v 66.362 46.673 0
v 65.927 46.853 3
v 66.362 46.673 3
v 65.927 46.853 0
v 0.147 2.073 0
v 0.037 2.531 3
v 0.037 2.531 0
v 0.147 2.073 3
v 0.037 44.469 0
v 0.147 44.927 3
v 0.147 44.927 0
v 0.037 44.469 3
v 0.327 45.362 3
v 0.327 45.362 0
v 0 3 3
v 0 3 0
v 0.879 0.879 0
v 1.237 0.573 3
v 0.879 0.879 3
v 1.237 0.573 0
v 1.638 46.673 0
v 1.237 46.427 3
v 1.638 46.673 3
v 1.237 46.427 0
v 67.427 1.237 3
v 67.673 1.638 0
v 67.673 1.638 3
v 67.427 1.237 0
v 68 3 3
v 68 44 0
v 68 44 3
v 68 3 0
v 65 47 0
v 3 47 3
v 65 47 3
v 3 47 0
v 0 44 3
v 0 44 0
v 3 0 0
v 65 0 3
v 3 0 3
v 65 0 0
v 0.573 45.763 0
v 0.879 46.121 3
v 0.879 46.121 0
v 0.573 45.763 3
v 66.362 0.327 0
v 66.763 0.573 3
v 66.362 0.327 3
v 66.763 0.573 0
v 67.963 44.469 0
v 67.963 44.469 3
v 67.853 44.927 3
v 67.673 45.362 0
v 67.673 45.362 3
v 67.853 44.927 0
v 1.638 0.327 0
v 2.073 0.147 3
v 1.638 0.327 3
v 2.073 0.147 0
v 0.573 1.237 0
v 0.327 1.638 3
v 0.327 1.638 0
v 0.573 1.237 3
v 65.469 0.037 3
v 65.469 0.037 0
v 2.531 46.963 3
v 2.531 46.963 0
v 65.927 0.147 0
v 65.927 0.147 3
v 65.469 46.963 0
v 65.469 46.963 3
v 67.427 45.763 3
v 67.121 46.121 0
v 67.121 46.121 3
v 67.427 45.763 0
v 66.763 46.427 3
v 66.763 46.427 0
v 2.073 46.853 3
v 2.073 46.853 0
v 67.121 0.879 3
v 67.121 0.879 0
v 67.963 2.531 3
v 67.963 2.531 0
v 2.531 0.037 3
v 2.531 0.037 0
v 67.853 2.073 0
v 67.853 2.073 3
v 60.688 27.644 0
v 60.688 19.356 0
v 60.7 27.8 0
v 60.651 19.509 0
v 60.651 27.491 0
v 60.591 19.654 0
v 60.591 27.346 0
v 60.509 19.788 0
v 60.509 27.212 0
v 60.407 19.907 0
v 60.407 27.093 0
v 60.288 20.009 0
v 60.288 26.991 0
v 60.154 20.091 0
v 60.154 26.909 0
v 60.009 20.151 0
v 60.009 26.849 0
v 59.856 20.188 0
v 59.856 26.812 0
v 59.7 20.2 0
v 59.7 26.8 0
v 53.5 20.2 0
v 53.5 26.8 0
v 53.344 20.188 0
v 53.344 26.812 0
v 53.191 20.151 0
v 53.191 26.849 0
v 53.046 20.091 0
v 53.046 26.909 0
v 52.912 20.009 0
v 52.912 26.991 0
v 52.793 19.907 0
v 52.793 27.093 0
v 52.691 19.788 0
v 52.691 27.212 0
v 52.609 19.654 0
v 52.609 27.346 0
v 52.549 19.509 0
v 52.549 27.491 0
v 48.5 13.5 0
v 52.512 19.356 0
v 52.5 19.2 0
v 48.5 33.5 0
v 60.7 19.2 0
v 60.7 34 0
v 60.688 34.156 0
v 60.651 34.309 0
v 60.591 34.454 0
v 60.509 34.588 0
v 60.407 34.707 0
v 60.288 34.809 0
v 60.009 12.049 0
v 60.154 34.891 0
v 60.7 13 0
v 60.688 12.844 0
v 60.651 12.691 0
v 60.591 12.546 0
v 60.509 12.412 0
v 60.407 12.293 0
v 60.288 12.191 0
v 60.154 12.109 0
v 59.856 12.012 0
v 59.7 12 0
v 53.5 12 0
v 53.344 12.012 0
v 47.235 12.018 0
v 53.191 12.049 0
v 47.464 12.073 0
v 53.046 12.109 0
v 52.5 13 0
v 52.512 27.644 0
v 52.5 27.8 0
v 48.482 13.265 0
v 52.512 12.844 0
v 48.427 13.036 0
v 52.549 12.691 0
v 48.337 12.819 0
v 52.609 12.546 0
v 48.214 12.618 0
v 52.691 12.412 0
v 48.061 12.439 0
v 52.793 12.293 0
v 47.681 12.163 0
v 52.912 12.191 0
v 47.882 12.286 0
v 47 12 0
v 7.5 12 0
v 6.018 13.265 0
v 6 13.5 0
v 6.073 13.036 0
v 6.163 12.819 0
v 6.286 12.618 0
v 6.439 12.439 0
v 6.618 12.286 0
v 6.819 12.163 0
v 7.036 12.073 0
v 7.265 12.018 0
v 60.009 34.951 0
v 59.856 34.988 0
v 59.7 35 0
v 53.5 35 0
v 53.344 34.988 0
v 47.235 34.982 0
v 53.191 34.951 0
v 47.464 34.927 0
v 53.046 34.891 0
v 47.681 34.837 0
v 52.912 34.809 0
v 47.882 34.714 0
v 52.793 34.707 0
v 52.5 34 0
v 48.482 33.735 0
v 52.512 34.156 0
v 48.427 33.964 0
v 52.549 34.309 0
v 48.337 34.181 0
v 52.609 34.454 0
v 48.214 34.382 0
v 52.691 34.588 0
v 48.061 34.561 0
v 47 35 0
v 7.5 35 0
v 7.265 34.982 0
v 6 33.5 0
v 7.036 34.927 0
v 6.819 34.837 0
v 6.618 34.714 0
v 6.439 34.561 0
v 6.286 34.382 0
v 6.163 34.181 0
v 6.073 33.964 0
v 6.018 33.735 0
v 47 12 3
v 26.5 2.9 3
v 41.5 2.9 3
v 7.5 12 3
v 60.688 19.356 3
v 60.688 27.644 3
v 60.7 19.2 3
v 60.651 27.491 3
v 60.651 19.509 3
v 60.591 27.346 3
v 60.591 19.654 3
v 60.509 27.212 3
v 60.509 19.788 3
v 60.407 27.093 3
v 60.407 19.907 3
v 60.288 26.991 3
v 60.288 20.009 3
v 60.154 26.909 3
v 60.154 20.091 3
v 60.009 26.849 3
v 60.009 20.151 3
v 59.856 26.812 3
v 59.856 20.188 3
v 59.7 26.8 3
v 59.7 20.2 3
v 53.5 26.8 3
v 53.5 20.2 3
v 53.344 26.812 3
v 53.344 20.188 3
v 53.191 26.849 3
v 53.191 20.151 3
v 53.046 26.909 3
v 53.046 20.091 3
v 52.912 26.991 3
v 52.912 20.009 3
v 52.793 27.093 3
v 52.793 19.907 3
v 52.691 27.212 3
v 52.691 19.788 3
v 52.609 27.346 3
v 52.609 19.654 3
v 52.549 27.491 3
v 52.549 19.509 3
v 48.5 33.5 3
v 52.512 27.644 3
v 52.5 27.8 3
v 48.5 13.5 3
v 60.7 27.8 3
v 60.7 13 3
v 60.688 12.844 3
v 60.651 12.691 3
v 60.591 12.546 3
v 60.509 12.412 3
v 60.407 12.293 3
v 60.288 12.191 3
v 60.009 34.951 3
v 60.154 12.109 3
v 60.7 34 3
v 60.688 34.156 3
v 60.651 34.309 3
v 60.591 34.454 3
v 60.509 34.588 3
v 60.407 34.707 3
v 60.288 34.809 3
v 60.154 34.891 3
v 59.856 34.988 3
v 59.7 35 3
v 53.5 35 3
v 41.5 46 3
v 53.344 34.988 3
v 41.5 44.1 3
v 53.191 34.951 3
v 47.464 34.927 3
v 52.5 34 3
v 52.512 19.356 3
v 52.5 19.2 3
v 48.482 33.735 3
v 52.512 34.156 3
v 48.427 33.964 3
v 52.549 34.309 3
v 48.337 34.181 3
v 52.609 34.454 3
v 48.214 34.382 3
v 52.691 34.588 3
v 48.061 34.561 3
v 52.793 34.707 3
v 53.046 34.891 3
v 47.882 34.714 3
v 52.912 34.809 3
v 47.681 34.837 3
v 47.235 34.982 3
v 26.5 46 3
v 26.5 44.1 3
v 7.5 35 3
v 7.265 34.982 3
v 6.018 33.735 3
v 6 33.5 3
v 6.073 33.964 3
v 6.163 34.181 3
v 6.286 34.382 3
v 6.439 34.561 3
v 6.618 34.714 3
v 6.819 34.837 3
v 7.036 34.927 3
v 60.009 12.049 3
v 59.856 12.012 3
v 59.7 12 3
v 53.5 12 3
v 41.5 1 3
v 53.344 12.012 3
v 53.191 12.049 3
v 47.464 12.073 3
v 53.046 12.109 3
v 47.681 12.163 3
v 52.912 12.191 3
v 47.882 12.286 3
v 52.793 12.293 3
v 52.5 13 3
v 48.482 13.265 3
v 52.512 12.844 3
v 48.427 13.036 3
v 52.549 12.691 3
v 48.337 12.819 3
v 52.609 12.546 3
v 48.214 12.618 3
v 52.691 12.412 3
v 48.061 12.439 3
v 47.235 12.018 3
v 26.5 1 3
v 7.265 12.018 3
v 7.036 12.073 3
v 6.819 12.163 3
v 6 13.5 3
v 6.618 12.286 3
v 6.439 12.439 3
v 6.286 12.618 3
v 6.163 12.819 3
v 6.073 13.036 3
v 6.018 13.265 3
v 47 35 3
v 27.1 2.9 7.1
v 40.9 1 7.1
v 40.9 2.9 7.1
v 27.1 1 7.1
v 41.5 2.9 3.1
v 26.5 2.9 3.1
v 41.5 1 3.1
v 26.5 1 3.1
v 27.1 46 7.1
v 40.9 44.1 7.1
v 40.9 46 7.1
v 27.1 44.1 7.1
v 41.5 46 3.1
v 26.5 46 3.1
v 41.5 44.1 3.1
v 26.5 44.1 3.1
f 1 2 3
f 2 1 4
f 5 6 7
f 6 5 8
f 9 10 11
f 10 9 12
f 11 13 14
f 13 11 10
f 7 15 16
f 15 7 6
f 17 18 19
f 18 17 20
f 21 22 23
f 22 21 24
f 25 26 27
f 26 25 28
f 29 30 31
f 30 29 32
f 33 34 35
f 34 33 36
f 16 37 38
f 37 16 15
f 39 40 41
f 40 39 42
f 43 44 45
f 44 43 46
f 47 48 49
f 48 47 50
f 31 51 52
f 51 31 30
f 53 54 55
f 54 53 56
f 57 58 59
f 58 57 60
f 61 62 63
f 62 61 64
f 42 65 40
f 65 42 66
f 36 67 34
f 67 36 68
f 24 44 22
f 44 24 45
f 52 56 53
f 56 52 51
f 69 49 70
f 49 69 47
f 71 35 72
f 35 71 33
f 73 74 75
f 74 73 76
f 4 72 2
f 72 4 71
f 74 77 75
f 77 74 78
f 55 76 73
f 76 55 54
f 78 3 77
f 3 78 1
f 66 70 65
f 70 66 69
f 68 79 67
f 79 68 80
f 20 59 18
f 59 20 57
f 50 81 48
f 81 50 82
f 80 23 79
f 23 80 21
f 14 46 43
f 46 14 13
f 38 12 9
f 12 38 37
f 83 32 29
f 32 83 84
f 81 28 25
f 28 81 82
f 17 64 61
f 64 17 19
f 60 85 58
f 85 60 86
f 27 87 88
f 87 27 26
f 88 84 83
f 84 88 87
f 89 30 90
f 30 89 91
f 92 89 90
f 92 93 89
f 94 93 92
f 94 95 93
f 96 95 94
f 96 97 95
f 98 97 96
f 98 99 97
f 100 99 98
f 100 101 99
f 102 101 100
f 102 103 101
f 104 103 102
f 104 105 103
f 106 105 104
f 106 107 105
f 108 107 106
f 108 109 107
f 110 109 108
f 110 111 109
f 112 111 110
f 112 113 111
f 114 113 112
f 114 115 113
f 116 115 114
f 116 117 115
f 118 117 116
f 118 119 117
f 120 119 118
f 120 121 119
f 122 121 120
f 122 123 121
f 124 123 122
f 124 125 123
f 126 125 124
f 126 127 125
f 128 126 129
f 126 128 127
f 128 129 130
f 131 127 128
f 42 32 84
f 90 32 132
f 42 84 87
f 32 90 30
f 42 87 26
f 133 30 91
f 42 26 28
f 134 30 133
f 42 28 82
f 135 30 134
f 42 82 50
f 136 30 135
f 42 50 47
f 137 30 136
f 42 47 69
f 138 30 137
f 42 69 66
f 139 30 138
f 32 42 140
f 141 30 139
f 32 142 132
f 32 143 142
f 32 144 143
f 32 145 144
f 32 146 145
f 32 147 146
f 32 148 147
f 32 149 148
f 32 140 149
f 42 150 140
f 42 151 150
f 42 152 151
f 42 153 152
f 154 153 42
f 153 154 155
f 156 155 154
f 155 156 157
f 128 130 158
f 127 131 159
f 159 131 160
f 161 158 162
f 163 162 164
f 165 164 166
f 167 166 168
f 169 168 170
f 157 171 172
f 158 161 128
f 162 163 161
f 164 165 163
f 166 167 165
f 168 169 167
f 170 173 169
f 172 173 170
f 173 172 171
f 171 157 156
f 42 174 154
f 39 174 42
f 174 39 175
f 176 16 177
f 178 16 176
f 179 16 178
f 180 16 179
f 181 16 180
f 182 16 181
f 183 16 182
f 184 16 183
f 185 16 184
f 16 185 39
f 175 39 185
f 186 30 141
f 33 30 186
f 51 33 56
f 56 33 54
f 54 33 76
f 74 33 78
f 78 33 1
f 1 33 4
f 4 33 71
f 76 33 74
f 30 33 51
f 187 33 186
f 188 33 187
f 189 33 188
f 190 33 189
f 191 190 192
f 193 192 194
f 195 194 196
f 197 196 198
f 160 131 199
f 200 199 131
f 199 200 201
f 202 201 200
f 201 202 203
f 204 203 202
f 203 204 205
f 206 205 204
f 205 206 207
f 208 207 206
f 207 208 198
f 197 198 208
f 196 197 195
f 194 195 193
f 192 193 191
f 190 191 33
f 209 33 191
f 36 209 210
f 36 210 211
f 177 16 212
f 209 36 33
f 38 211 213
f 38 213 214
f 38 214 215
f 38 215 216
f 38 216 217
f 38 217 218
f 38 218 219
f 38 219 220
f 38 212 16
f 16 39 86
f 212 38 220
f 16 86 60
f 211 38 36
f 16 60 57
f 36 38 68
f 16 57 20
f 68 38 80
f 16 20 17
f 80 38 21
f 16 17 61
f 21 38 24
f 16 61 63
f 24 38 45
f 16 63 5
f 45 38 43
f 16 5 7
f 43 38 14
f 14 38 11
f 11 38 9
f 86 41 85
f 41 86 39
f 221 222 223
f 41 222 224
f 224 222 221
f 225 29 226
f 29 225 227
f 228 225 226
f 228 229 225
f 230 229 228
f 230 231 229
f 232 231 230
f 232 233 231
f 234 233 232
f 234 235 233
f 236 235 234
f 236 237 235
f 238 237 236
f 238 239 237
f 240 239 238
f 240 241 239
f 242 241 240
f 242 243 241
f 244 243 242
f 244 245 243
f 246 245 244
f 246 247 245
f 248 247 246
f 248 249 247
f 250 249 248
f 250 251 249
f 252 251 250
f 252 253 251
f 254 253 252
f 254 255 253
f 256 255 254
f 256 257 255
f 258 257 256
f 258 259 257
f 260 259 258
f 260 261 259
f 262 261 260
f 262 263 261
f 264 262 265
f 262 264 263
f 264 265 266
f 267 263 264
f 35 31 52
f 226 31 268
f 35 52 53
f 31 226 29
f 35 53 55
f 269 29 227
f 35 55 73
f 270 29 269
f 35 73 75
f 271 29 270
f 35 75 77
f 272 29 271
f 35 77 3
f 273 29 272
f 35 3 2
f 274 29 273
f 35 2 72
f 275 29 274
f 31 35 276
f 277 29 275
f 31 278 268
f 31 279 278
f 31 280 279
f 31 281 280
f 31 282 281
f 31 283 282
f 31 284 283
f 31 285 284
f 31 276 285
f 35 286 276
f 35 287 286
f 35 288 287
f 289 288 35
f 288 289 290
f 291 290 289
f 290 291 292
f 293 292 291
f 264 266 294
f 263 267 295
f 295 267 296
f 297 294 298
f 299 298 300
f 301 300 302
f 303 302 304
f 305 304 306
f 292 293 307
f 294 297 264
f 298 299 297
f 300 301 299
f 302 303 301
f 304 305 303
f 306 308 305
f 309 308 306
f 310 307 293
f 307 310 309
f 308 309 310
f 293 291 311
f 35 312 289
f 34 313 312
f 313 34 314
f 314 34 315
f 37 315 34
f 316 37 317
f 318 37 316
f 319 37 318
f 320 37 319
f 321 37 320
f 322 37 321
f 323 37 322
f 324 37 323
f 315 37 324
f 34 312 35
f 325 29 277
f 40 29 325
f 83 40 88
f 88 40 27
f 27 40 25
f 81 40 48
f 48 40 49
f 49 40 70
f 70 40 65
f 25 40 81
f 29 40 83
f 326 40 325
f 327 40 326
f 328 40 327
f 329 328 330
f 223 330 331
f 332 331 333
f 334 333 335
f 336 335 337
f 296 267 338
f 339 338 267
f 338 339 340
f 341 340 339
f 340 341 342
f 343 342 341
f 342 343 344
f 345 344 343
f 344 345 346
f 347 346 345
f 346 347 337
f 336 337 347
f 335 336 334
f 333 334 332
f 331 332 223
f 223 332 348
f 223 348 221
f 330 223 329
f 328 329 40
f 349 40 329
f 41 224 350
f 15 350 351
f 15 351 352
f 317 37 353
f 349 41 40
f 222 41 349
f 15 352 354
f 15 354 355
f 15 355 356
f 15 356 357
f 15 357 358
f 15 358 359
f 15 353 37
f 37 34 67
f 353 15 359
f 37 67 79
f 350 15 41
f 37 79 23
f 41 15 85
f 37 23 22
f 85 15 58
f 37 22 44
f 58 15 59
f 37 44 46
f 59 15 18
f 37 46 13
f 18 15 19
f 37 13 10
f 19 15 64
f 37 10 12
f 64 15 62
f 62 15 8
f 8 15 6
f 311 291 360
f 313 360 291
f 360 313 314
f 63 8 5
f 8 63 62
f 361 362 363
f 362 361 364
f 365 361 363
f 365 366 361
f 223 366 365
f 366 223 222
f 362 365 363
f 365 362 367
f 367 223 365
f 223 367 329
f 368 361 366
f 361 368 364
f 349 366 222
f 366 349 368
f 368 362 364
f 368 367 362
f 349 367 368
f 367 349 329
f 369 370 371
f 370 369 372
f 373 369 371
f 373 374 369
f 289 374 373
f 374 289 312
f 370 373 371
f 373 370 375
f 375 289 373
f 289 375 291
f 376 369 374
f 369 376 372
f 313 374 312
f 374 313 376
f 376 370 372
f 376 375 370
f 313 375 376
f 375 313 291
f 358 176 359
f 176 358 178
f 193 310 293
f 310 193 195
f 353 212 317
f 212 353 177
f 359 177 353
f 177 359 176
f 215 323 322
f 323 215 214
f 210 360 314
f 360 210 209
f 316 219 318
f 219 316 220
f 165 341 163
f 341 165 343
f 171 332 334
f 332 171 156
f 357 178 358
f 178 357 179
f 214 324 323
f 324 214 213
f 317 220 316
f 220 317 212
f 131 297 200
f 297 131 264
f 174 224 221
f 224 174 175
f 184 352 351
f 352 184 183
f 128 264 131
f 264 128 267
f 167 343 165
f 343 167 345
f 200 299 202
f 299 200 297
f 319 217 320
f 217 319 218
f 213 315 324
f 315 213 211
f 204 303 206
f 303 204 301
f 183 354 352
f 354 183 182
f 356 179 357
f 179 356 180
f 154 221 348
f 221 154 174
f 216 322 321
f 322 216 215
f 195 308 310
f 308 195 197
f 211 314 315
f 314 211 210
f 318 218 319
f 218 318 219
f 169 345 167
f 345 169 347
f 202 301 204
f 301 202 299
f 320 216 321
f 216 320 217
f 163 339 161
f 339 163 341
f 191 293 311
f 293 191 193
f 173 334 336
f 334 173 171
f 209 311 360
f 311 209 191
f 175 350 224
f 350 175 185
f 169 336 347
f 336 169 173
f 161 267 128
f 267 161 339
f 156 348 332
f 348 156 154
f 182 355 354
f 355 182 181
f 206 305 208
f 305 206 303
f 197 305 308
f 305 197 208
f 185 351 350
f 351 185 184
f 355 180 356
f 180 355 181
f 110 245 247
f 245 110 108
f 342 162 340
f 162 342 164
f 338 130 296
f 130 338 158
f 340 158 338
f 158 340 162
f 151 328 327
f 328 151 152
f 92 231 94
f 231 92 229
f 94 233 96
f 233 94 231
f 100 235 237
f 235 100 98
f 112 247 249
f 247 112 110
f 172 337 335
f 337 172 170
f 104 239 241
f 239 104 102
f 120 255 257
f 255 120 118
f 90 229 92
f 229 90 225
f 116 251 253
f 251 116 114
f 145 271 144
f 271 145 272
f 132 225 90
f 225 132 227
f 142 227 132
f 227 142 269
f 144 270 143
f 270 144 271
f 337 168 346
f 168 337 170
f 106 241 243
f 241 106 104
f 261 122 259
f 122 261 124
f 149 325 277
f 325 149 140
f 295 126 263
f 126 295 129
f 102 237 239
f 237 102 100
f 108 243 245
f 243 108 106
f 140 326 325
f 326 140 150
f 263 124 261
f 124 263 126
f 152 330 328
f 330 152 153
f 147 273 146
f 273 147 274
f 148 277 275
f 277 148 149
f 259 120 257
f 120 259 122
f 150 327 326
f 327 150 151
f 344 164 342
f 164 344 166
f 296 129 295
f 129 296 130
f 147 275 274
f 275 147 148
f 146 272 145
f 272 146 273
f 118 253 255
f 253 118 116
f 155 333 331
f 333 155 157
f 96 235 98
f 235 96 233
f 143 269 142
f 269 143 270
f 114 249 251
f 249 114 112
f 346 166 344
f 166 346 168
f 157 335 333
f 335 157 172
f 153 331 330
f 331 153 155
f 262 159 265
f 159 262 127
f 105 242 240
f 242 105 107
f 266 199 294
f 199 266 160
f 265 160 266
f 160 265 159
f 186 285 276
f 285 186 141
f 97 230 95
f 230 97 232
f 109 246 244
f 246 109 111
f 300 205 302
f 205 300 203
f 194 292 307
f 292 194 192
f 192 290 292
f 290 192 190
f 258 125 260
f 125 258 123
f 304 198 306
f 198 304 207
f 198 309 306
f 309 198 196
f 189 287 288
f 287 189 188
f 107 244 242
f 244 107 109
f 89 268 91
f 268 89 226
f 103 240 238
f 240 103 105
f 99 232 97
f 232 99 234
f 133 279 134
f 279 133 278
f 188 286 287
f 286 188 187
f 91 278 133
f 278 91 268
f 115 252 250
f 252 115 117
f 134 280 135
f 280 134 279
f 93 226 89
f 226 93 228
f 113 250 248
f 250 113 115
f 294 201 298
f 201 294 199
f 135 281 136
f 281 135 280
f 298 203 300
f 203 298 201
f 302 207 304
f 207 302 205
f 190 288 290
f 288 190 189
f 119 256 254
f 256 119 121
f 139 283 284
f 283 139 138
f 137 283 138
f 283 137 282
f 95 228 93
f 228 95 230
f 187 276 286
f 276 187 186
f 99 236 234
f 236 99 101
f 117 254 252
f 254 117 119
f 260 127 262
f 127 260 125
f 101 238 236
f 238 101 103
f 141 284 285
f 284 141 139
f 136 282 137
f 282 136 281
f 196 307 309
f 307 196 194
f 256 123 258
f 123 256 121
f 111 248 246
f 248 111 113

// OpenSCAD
// ============================================================
// MODULE HORLOGE / INCLINOMÈTRE SUZUKI SAMURAI SJ413
// Pièce 1/2 : FAÇADE AVANT — 01_facade_samurai.scad
// Carte : ESP32-S3 avec écran IPS 1.9" intégré (170x320, ST7789)
// Assemblage : pattes rectangulaires en interférence (pas de vis)
// ============================================================
// IMPORTANT — repère PARTAGÉ avec 02_boitier_corps.scad :
// (0,0) = coin bas-gauche de la DÉCOUPE DU TABLEAU DE BORD
// (63x42mm), PAS le coin de la façade elle-même. La façade
// déborde donc de -rebord_facade à largeur_trou+rebord_facade.
// Toute position de patte/bouton/écran ci-dessous est exprimée
// en coordonnées "trou", puis translatée de +rebord_facade pour
// entrer dans le repère local du panneau. Cela permet de copier
// telles quelles les mêmes coordonnées "trou" dans le fichier du
// boîtier sans recalcul.
// ============================================================

$fn = 40;

// --- Dimensions de la découpe d'origine du tableau de bord ---
largeur_trou  = 63.0;
hauteur_trou  = 42.0;
rebord_facade = 2.5;               // débord de la collerette autour du trou

L_facade = largeur_trou + (rebord_facade * 2); // 68 mm
H_facade = hauteur_trou + (rebord_facade * 2); // 47 mm
epaisseur_facade = 3.0;

// --- Zone d'affichage utile de l'écran 1.9" (coord. "trou") ---
largeur_ecran     = 42.5;
hauteur_ecran     = 23.0;
x_ecran_trou      = 3.5;                              // marge à gauche
y_ecran_trou      = (hauteur_trou - hauteur_ecran)/2;  // centré verticalement

// --- Boutons poussoirs silicone 8x8x5mm (jeu de perçage 0.2mm) ---
largeur_bouton = 8.2;
hauteur_bouton = 8.2;
x_bouton_trou      = 50.0;
y_bouton_haut_trou = 9.5;
y_bouton_bas_trou  = 24.3;

// --- Pattes d'assemblage en interférence (clips sans vis) ---
// Cohérent avec 02_boitier_corps.scad :
largeur_patte   = 15.0;
epaisseur_patte = 1.9;   // légèrement > l'ouverture de l'encoche -> interférence
longueur_patte  = 4.0;   // reste dans la zone d'étagère avant du boîtier (voir profondeur_ledge)
x_patte_trou    = (largeur_trou - largeur_patte) / 2;   // centré en largeur : 24.0

module rectangle_arrondi(l, h, r) {
    hull() {
        translate([r, r]) circle(r=r);
        translate([l-r, r]) circle(r=r);
        translate([l-r, h-r]) circle(r=r);
        translate([r, h-r]) circle(r=r);
    }
}

// Patte simple avec léger chanfrein d'entrée (reste manifold via hull)
module patte_interference(largeur, epaisseur, longueur) {
    hull() {
        cube([largeur, epaisseur, 0.1]);                    // base, collée à la façade
        translate([0.6, 0, longueur])
            cube([largeur - 1.2, epaisseur, 0.1]);            // bout chanfreiné, guide l'insertion
    }
}

module facade_1_9() {
    difference() {
        union() {
            // Cadre principal de façade
            linear_extrude(height = epaisseur_facade)
                rectangle_arrondi(L_facade, H_facade, 3.0);

            // Patte haute (s'enfonce dans l'encoche haute du boîtier)
            translate([rebord_facade + x_patte_trou, rebord_facade - epaisseur_patte + 0.4, epaisseur_facade])
                patte_interference(largeur_patte, epaisseur_patte, longueur_patte);

            // Patte basse (s'enfonce dans l'encoche basse du boîtier)
            translate([rebord_facade + x_patte_trou, rebord_facade + hauteur_trou - 0.4, epaisseur_facade])
                patte_interference(largeur_patte, epaisseur_patte, longueur_patte);
        }

        // Fenêtre centrale pour l'écran
        translate([rebord_facade + x_ecran_trou, rebord_facade + y_ecran_trou, -1])
            linear_extrude(height = epaisseur_facade + 6)
                rectangle_arrondi(largeur_ecran, hauteur_ecran, 1.5);

        // Bouton 1 (haut) : cycle des modes d'affichage
        translate([rebord_facade + x_bouton_trou, rebord_facade + y_bouton_haut_trou, -1])
            linear_extrude(height = epaisseur_facade + 6)
                rectangle_arrondi(largeur_bouton, hauteur_bouton, 1.0);

        // Bouton 2 (bas) : calibrage / réglage
        translate([rebord_facade + x_bouton_trou, rebord_facade + y_bouton_bas_trou, -1])
            linear_extrude(height = epaisseur_facade + 6)
                rectangle_arrondi(largeur_bouton, hauteur_bouton, 1.0);
    }
}

facade_1_9();
